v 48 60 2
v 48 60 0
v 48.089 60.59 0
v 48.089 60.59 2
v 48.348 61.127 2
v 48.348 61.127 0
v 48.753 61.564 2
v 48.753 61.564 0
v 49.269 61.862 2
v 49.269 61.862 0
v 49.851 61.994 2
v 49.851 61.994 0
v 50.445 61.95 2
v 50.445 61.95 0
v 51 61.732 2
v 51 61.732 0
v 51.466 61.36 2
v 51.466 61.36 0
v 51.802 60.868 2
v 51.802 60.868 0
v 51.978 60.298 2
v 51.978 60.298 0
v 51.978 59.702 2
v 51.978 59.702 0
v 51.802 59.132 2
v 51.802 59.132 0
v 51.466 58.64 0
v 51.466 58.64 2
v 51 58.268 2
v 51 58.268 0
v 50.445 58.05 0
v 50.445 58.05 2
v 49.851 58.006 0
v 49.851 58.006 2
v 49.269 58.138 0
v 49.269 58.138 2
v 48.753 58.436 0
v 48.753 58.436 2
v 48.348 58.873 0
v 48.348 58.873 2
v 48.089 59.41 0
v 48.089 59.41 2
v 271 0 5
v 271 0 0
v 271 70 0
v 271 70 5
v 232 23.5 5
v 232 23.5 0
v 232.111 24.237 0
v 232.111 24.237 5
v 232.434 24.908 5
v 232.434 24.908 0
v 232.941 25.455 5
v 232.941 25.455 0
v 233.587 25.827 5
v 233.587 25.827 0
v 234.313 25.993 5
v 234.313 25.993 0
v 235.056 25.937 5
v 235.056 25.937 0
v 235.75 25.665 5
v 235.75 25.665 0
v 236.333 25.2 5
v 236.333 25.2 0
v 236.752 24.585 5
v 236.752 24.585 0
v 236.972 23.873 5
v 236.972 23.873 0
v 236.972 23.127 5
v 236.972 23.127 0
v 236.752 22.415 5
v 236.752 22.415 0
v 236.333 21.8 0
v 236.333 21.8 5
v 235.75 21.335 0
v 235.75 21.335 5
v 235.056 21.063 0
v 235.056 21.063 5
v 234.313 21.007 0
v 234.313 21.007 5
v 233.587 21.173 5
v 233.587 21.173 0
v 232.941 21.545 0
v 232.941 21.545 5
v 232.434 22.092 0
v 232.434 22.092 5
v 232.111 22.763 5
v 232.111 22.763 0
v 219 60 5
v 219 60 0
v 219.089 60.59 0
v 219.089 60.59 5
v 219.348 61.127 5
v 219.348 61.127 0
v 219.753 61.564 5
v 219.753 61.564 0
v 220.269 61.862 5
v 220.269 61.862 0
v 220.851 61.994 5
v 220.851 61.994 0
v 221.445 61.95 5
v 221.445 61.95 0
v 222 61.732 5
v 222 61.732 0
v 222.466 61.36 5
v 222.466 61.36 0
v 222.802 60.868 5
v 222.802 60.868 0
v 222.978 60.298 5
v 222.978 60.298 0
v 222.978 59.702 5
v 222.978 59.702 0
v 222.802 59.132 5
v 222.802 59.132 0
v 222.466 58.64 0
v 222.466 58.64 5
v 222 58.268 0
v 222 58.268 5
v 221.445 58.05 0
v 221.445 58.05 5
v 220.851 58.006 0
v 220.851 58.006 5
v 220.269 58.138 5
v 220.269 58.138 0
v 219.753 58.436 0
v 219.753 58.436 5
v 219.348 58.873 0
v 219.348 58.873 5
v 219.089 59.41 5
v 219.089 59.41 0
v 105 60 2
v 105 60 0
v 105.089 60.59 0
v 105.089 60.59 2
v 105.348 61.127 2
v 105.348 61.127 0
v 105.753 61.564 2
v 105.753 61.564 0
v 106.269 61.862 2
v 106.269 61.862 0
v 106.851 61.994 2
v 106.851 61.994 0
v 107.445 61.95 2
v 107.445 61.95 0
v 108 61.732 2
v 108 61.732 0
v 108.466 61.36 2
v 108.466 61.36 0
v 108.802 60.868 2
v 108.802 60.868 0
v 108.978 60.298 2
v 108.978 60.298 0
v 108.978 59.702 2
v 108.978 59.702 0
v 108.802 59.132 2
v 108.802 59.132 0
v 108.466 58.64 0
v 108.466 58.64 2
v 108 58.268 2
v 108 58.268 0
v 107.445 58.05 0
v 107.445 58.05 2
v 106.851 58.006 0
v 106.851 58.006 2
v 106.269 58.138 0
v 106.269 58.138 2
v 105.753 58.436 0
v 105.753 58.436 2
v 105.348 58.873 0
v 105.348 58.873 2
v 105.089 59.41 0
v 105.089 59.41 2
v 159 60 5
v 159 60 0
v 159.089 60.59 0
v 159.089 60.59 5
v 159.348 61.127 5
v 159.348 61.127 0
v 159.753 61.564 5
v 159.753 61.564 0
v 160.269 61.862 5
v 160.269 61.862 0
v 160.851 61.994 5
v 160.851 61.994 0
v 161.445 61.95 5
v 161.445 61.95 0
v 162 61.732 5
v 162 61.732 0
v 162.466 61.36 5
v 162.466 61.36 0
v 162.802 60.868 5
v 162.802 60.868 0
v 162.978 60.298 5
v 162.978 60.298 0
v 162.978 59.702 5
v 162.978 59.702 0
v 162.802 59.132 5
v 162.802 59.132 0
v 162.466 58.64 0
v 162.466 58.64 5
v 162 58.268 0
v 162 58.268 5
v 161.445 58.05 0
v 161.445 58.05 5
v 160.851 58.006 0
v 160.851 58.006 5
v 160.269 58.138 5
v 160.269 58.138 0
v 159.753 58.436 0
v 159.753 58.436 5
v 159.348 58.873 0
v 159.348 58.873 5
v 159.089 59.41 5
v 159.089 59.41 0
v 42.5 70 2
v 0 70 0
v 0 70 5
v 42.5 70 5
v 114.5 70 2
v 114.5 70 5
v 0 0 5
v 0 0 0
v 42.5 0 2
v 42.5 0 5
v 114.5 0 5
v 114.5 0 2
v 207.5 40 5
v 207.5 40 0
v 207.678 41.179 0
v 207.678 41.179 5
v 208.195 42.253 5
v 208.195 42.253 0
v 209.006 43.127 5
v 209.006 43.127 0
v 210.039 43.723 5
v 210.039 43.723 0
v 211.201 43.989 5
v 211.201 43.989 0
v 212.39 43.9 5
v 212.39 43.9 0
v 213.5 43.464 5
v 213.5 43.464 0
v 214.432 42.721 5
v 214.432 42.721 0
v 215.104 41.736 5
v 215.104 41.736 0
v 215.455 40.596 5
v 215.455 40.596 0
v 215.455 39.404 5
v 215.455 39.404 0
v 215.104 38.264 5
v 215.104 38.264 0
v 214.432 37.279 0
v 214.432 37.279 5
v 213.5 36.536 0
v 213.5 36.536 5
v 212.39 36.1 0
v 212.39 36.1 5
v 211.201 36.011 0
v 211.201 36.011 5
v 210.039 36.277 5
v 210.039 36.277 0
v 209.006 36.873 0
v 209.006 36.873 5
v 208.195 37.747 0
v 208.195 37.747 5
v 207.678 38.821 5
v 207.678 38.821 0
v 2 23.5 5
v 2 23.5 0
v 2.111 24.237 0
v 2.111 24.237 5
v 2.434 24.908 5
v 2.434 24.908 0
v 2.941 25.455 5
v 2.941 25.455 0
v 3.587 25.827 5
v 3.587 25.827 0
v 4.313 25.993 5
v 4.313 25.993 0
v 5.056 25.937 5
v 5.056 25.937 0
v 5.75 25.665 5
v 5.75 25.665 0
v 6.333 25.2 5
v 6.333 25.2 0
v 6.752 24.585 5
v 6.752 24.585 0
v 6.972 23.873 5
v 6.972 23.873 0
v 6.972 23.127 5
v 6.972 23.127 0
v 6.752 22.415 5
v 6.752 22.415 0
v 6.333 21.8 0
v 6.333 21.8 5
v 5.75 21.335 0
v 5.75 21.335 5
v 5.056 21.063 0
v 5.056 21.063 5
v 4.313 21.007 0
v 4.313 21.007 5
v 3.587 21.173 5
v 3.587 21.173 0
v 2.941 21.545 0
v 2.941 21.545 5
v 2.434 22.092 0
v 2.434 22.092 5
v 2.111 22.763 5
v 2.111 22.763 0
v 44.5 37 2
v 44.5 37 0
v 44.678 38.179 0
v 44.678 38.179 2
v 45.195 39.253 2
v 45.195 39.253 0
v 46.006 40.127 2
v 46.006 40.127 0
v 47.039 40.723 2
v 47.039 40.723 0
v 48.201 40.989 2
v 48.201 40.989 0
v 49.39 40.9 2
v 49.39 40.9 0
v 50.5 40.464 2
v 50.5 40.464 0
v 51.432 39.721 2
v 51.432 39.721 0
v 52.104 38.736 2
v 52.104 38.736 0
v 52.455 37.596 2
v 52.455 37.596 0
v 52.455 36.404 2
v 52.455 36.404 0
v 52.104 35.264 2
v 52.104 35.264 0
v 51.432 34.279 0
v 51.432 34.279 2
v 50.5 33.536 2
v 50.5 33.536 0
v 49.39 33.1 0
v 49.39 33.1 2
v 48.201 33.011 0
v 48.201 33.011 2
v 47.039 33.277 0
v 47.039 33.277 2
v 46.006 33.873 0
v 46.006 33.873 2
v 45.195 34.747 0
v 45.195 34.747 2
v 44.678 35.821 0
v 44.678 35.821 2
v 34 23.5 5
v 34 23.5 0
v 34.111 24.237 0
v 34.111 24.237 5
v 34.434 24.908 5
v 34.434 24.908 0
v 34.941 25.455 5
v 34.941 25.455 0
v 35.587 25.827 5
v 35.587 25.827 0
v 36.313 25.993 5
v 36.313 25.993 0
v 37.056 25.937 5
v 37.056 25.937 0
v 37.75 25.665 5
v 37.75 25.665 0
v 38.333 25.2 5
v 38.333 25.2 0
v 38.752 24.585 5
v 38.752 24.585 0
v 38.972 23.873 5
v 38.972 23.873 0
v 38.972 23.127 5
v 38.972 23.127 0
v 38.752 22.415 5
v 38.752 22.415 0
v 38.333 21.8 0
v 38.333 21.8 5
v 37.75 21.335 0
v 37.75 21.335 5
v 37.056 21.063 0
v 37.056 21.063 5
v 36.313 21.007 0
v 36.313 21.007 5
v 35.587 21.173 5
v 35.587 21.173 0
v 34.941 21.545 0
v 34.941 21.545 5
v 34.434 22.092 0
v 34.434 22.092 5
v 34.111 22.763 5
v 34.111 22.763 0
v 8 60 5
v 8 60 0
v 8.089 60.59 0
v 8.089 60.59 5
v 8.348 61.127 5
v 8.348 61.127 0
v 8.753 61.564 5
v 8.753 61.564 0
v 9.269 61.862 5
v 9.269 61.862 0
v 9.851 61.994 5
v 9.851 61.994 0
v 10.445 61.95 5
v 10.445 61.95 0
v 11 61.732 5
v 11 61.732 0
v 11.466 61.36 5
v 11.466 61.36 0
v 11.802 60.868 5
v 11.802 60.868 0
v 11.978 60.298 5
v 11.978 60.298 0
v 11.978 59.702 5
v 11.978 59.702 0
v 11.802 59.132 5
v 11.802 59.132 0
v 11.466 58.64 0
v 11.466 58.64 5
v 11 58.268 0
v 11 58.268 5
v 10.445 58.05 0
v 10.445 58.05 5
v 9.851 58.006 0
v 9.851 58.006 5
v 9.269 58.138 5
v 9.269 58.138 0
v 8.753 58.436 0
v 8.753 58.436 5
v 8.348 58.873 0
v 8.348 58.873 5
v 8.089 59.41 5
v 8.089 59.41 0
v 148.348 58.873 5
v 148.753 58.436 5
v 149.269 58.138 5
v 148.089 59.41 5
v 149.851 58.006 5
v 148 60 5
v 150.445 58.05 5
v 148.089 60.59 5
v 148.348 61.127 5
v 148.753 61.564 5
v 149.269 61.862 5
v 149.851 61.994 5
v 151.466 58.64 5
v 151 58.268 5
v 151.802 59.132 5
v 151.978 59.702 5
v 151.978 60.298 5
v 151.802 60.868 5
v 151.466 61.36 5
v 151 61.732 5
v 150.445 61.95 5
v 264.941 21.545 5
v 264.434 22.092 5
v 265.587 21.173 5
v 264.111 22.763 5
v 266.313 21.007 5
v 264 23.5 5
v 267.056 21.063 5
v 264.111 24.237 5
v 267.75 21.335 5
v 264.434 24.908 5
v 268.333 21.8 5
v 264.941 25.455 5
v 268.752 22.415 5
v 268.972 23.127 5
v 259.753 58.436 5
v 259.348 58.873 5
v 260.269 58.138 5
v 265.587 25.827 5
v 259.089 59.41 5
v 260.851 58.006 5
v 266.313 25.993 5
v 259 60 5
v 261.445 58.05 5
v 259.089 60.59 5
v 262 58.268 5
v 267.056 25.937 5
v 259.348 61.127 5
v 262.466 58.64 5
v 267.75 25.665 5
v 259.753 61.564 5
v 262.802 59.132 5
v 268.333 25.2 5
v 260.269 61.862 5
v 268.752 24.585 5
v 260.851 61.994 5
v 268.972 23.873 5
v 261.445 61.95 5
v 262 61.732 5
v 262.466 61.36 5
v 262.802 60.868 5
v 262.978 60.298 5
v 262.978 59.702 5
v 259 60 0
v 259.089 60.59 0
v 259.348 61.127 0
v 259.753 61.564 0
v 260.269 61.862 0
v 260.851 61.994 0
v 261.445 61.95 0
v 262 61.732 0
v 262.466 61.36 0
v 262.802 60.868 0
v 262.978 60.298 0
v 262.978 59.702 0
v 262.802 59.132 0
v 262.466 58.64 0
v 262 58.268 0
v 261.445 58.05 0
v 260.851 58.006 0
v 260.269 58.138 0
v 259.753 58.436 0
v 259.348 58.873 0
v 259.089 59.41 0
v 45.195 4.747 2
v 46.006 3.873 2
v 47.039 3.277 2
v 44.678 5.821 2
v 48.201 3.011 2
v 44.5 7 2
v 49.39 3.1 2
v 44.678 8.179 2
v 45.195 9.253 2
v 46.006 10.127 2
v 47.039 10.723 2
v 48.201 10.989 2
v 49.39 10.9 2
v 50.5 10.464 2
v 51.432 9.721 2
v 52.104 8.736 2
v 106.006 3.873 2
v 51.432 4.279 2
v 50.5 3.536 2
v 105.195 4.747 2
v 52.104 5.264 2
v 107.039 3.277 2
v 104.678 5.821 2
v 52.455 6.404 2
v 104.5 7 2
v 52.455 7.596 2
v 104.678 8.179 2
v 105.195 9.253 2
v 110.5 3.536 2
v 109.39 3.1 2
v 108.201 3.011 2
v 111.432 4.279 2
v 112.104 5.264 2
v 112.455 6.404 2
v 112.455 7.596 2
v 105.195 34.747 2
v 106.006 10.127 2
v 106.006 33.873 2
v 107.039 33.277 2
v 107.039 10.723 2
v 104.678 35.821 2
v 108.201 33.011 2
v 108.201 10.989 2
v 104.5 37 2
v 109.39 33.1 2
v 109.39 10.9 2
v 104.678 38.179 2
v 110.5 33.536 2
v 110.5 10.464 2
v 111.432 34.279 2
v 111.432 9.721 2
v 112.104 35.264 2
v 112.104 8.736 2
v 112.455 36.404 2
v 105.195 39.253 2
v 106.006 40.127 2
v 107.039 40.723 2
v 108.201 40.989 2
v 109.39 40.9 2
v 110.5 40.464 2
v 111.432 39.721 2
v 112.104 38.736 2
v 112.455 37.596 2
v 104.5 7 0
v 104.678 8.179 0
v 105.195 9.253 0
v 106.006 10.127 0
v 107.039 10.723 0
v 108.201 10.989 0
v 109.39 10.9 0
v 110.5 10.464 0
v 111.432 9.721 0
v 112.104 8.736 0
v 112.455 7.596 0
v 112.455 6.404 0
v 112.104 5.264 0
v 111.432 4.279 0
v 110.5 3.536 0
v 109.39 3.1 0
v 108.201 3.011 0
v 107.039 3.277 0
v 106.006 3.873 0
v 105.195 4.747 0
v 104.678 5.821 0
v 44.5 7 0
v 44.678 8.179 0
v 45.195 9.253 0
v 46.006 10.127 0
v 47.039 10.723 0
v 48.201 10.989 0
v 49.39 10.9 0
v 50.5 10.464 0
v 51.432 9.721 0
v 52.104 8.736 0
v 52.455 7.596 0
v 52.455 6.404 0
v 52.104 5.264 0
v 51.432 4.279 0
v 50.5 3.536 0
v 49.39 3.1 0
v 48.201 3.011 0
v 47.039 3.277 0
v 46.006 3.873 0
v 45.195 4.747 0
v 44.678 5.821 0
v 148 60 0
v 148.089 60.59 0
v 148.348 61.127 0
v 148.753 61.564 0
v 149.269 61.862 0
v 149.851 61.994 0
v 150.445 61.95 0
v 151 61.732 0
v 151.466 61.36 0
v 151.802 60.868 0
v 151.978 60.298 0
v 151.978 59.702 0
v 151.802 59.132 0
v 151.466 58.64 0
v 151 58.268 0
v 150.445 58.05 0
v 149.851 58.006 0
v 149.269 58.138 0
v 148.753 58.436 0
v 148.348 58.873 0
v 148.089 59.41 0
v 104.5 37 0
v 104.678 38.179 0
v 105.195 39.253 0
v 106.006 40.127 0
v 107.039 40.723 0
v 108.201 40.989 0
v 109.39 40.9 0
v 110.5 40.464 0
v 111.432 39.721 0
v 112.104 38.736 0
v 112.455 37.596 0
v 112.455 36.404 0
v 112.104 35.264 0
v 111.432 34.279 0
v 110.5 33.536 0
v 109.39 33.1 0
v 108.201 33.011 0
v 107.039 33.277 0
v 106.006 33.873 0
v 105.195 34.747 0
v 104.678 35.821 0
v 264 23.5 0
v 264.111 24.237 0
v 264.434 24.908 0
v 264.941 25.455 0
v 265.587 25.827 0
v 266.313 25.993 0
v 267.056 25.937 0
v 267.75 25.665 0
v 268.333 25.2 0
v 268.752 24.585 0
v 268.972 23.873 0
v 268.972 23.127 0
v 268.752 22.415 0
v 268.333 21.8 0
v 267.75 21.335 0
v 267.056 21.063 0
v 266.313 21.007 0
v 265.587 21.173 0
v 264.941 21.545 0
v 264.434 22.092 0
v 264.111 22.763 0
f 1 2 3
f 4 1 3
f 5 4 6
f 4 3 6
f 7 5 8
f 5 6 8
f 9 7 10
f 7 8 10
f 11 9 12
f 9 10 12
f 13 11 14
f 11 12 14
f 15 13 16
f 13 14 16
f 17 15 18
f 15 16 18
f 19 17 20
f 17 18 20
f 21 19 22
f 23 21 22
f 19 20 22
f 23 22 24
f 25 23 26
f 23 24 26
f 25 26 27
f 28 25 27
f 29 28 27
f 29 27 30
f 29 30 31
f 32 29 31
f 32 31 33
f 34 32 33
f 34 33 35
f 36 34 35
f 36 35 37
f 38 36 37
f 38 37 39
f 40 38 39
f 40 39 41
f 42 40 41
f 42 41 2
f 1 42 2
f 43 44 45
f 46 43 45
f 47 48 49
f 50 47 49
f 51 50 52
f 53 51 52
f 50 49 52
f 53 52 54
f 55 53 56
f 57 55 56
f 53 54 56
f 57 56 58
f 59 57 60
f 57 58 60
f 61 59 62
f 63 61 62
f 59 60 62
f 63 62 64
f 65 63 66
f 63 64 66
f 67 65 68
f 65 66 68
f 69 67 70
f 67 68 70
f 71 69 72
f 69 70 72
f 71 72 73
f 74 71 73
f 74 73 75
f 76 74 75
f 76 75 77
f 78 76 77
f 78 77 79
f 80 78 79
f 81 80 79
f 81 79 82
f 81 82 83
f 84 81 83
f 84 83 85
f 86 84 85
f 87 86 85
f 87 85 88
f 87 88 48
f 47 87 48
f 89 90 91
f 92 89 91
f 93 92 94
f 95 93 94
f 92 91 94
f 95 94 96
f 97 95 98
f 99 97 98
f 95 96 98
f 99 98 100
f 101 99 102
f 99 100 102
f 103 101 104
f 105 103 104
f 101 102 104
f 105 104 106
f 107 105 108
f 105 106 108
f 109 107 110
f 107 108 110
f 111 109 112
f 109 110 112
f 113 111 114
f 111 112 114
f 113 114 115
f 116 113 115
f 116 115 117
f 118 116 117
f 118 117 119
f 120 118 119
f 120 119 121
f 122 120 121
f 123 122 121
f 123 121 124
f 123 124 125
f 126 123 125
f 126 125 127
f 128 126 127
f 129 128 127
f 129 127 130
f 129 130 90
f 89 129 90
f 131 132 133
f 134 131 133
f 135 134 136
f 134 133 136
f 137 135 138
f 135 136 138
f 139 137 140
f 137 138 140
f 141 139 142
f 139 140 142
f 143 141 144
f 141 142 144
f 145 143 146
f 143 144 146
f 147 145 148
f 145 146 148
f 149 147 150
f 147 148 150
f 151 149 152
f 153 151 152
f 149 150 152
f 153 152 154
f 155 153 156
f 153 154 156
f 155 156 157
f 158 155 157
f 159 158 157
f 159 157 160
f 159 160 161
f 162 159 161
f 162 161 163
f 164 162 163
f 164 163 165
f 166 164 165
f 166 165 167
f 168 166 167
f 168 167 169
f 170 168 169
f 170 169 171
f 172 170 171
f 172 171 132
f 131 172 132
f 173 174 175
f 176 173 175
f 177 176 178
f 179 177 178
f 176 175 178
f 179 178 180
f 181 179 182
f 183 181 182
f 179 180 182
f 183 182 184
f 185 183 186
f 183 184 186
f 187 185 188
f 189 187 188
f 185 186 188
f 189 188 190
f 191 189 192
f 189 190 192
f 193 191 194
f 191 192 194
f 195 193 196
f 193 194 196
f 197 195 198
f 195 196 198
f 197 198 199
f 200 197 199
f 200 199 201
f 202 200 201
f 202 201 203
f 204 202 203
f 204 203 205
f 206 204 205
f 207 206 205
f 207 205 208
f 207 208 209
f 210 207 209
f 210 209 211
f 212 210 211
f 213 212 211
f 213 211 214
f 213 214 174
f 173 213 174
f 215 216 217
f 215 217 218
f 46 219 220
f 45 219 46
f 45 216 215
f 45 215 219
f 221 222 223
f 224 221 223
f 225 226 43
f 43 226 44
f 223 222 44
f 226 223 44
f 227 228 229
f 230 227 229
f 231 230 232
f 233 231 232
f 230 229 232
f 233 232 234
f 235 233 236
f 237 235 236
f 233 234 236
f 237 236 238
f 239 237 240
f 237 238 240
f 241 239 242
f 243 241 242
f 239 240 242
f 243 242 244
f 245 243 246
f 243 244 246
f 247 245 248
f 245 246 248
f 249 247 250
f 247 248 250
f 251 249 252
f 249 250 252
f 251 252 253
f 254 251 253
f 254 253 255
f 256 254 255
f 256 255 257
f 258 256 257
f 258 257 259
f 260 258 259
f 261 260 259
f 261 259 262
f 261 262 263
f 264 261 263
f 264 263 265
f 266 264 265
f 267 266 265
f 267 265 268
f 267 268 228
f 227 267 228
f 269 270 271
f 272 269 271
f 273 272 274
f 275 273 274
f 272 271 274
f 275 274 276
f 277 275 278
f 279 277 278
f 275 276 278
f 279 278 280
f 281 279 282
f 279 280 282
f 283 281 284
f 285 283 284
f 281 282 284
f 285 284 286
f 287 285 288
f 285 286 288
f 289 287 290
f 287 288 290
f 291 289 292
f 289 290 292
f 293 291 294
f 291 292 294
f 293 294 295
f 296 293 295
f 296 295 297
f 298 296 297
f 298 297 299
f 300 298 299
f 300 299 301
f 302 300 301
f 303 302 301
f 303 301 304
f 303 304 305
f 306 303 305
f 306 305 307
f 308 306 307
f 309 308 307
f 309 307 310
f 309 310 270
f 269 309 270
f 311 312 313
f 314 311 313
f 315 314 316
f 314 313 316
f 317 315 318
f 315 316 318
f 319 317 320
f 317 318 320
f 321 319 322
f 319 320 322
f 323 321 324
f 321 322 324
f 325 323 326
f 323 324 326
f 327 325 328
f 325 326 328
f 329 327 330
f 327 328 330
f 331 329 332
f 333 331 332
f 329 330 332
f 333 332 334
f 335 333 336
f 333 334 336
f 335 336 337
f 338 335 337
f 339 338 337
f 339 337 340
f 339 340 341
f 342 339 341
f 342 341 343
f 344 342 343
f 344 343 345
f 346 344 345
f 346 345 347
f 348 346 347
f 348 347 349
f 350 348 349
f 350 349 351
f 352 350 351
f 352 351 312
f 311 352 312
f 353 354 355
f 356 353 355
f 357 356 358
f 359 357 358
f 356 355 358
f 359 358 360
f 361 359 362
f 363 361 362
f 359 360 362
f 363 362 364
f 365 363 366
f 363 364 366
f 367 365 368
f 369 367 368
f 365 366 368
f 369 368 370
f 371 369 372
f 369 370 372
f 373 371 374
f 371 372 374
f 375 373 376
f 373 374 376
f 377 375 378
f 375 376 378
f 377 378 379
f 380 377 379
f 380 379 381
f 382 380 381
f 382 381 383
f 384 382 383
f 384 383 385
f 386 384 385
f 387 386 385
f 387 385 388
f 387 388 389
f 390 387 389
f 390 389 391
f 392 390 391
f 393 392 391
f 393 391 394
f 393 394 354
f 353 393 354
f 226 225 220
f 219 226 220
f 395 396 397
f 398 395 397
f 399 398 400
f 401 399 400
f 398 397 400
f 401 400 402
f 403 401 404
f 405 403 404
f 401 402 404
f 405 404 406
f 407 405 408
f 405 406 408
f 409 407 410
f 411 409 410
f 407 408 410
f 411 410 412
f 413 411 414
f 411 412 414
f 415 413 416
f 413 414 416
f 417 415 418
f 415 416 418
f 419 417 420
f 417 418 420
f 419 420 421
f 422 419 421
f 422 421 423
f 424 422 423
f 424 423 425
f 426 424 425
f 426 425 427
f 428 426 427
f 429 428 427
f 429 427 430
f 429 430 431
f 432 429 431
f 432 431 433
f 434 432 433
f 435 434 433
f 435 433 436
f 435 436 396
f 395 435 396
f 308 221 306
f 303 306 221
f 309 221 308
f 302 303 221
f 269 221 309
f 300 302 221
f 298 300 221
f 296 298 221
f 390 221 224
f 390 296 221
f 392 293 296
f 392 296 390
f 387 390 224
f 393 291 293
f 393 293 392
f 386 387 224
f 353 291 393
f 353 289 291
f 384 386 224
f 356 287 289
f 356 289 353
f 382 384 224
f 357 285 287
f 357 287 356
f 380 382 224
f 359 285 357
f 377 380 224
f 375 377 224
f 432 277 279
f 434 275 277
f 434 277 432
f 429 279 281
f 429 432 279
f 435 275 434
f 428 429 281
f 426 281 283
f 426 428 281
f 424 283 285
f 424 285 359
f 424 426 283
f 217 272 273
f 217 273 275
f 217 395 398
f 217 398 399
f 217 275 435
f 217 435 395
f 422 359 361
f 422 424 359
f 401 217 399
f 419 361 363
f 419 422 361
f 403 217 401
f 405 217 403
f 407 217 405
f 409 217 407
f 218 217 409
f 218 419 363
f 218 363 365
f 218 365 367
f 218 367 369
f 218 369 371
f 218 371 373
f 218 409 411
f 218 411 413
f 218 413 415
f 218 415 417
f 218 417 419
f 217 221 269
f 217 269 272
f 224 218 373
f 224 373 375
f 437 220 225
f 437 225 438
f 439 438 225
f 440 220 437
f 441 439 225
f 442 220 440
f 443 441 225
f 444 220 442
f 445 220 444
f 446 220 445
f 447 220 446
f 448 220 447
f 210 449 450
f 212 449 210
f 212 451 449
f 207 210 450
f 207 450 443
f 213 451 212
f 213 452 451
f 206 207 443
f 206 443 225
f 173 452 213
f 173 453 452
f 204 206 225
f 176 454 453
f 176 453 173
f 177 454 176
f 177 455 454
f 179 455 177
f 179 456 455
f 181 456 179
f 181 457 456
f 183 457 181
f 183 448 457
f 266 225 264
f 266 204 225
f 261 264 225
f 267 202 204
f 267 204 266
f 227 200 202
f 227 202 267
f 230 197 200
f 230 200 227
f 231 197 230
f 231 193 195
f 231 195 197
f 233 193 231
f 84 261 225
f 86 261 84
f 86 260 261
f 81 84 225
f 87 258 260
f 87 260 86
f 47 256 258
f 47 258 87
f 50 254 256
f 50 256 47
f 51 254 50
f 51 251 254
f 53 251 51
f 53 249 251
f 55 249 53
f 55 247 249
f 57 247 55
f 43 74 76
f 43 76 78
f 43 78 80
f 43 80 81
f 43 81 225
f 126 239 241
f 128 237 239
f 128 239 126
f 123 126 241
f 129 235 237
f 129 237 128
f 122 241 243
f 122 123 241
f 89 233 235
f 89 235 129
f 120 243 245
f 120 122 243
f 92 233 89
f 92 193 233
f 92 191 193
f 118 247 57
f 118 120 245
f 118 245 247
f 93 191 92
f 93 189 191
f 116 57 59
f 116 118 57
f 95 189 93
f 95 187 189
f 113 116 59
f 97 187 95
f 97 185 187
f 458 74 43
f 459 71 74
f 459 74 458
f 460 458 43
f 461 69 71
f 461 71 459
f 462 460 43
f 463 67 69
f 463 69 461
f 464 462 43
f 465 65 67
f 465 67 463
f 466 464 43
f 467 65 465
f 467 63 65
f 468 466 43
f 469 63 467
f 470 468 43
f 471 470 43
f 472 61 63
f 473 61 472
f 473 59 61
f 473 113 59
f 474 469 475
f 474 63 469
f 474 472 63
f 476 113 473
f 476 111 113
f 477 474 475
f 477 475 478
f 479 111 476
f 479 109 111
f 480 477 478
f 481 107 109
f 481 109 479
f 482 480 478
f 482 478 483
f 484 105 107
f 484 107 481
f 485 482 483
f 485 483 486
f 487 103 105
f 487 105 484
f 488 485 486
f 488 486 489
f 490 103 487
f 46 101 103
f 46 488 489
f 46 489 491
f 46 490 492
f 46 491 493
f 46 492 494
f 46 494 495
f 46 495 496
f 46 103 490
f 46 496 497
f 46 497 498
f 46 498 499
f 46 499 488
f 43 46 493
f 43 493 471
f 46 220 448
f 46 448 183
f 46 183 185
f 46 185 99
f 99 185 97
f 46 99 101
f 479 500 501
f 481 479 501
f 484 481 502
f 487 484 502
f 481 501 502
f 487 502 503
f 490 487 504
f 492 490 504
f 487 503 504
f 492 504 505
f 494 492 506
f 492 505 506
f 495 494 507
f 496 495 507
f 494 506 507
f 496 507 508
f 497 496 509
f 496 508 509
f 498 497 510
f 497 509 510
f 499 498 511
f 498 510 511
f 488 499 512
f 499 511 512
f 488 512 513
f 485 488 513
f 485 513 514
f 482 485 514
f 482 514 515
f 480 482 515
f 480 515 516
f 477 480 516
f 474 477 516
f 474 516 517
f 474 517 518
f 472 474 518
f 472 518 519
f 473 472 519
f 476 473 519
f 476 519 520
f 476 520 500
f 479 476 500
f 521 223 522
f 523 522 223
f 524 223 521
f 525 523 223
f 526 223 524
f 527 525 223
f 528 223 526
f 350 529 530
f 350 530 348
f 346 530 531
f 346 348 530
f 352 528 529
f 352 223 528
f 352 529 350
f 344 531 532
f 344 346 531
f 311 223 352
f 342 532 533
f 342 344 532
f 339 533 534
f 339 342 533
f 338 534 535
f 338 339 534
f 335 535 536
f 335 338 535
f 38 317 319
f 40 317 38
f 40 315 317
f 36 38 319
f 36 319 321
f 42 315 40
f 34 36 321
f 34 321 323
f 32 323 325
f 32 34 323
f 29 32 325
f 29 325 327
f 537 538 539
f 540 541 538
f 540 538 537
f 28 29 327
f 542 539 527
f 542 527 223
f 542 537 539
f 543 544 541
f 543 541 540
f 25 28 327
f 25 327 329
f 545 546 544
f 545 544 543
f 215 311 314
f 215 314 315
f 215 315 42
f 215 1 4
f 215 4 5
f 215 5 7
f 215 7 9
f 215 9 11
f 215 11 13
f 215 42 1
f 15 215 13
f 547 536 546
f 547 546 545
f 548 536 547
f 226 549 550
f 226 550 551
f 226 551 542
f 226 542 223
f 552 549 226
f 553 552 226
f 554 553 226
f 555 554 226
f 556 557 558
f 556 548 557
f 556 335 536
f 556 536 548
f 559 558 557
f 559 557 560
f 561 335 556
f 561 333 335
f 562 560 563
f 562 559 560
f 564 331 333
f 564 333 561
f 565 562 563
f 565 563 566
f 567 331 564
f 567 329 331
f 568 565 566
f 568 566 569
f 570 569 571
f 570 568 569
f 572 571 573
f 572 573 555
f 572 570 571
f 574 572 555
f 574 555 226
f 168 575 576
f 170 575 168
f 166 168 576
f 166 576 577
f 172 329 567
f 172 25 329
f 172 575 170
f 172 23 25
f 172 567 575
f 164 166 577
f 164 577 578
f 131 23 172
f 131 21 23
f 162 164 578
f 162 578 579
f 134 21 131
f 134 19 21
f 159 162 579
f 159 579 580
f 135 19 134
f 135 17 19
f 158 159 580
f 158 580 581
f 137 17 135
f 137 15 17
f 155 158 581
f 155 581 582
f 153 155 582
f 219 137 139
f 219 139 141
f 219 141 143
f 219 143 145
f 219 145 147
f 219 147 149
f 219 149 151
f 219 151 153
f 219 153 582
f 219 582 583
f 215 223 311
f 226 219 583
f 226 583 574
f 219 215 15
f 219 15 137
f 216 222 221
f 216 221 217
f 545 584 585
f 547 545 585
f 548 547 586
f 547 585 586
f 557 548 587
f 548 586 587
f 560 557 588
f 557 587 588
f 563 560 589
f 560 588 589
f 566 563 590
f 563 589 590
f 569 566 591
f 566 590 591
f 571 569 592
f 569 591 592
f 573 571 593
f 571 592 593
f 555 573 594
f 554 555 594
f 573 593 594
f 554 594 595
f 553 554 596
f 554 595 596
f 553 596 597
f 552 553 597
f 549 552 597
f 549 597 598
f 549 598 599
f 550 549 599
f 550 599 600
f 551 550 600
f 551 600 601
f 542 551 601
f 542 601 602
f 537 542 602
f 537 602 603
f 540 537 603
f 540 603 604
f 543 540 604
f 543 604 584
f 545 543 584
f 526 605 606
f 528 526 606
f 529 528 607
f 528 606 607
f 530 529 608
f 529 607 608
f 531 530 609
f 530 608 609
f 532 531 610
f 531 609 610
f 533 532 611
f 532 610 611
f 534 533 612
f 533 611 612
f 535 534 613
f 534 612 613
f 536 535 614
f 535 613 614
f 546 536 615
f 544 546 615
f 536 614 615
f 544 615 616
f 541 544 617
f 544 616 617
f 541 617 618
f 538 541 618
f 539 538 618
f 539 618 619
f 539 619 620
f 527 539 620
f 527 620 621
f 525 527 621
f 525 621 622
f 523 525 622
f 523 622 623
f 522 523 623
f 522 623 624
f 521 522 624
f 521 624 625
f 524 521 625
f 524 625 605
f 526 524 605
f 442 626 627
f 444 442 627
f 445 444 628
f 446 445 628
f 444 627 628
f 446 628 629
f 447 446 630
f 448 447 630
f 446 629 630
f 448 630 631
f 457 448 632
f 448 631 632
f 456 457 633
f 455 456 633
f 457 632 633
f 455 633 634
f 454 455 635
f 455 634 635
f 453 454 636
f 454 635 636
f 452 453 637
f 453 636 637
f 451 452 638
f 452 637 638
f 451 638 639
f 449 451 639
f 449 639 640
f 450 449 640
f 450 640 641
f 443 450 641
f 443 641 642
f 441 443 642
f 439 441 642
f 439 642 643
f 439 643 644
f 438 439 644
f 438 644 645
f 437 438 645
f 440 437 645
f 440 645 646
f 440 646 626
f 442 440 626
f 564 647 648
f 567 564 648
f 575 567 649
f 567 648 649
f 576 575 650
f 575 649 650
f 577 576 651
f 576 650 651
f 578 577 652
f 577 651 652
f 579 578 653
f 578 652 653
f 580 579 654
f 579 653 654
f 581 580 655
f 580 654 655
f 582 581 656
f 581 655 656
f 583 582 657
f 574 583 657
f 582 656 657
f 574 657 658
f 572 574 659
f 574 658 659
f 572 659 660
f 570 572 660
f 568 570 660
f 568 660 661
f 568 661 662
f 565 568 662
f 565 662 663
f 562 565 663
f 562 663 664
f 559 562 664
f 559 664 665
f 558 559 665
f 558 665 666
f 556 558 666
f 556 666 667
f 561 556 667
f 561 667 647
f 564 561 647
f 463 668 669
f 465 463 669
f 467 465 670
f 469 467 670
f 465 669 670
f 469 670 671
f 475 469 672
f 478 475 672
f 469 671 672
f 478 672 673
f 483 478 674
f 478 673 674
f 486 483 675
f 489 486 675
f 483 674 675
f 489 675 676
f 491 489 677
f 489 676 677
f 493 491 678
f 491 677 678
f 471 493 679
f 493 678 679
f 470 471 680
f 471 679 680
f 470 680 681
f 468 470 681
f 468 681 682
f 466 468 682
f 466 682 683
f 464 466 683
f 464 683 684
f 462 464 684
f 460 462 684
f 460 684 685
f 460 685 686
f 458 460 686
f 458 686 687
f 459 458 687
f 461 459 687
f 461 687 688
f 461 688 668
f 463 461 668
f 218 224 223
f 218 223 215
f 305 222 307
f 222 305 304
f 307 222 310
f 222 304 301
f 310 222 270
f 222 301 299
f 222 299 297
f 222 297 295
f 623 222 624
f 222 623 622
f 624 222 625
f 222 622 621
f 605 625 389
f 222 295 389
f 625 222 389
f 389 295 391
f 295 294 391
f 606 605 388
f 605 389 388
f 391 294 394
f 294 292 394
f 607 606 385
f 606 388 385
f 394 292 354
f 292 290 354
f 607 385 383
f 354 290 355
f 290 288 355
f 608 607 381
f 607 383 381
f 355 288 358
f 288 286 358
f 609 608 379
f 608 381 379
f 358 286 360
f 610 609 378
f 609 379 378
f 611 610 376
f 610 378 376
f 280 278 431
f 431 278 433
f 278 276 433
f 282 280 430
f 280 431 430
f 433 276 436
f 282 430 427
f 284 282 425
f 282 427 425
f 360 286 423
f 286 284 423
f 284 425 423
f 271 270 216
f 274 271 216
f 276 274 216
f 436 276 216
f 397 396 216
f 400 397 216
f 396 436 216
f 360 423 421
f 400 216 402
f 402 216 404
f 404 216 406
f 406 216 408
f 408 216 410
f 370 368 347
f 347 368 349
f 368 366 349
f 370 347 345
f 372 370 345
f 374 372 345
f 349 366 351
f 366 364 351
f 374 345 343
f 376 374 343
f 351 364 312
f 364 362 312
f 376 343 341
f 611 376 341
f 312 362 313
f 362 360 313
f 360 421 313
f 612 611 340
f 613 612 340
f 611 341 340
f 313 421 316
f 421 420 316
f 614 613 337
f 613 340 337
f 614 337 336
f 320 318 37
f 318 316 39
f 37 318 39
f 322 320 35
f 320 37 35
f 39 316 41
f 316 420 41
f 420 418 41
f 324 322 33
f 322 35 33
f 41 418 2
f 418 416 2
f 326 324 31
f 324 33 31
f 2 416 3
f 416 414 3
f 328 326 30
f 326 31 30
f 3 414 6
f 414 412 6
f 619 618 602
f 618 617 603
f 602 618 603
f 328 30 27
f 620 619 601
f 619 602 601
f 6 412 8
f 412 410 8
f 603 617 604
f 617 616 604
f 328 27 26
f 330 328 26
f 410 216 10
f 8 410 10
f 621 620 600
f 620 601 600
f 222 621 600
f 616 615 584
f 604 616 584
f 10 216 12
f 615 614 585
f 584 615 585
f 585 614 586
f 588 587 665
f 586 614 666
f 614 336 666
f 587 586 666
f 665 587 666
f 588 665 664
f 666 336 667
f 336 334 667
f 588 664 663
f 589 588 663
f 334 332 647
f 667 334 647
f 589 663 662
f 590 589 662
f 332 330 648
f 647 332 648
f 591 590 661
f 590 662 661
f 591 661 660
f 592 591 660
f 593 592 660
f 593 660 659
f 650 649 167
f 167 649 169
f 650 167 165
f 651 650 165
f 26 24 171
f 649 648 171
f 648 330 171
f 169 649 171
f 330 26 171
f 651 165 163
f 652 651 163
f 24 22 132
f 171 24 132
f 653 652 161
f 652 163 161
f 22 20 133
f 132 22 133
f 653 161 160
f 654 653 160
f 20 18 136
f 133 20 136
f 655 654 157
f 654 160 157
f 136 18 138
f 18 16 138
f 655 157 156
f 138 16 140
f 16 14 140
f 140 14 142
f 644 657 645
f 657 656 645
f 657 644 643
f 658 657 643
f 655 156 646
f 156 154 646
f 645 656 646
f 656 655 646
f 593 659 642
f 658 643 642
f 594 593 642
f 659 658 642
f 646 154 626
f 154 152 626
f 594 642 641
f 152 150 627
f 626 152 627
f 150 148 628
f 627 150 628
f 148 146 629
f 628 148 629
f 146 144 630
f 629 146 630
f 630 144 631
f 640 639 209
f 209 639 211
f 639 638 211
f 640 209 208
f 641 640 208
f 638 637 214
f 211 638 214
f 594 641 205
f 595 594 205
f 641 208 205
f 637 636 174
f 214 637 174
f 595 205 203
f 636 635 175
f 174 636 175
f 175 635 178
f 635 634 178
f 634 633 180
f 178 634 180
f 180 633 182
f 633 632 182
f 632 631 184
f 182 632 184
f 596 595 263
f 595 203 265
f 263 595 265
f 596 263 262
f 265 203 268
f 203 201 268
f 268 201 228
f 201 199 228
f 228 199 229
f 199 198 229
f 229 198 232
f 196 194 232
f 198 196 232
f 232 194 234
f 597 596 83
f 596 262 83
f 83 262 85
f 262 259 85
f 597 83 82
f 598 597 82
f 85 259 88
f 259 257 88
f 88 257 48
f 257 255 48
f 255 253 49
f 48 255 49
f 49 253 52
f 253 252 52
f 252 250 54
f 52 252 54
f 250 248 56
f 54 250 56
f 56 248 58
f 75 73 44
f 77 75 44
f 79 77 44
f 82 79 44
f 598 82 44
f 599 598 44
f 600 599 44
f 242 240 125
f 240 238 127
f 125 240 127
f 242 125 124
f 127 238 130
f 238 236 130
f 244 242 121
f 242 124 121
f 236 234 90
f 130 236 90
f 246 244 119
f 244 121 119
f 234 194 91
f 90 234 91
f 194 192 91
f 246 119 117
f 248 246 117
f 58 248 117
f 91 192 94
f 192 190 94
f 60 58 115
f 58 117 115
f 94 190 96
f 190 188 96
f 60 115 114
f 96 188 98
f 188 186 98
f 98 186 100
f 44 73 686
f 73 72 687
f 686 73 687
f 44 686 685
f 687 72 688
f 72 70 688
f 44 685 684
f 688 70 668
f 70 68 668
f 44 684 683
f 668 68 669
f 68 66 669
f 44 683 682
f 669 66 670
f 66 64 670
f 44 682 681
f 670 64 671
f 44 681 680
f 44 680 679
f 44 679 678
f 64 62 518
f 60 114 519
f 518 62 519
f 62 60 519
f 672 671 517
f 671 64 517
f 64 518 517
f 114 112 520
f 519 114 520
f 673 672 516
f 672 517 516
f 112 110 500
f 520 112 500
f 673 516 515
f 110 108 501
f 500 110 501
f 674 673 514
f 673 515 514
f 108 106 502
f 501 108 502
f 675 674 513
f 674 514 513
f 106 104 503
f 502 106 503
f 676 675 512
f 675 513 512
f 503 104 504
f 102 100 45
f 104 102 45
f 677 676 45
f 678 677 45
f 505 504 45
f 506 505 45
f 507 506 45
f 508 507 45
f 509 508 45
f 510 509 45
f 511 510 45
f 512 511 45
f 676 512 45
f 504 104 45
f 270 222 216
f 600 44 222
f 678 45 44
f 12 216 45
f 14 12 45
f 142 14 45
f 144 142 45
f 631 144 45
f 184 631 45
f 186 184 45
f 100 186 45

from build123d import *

# Parameters (mm, degrees)
SKIZZE1_W                       = 271
SKIZZE1_H                       = 70
AUFSATZ_LINEAR_AUSTRAGEN1_DEPTH = 5
SKIZZE2_W                       = 72
SKIZZE2_H                       = 70
SCHNITT_LINEAR_AUSTRAGEN1_DEPTH = 3
SKIZZE3_R                       = 4
SCHNITT_LINEAR_AUSTRAGEN2_DEPTH = 10
SKIZZE4_R                       = 2.5
SCHNITT_LINEAR_AUSTRAGEN3_DEPTH = 10
SKIZZE5_R                       = 2.5
SCHNITT_LINEAR_AUSTRAGEN4_DEPTH = 10
SKIZZE6_R                       = 2
SCHNITT_LINEAR_AUSTRAGEN5_DEPTH = 10
SKIZZE7_R                       = 4
SCHNITT_LINEAR_AUSTRAGEN6_DEPTH = 10
SKIZZE8_R                       = 2
SCHNITT_LINEAR_AUSTRAGEN7_DEPTH = 10


with BuildPart() as part:
    # Skizze1 → Aufsatz-Linear austragen1 (new body)
    with BuildSketch(Plane.XY):
        with Locations((135.5, 35)):
            Rectangle(SKIZZE1_W, SKIZZE1_H)
    extrude(amount=AUFSATZ_LINEAR_AUSTRAGEN1_DEPTH)

    # Skizze2 → Schnitt-Linear austragen1 (cut)
    with BuildSketch(Plane.XY.offset(5)):
        with Locations((78.5, 35)):
            Rectangle(SKIZZE2_W, SKIZZE2_H)
    extrude(amount=-SCHNITT_LINEAR_AUSTRAGEN1_DEPTH, mode=Mode.SUBTRACT)

    # Skizze3 → Schnitt-Linear austragen2 (cut)
    with BuildSketch(Plane(origin=(0, 0, 0), x_dir=(-1, 0, 0), z_dir=(0, 0, -1))):
        with Locations((-48.5, 37)):
            Circle(SKIZZE3_R)
        with Locations((-108.5, 37)):
            Circle(SKIZZE3_R)
        with Locations((-108.5, 7)):
            Circle(SKIZZE3_R)
        with Locations((-48.5, 7)):
            Circle(SKIZZE3_R)
    extrude(amount=-SCHNITT_LINEAR_AUSTRAGEN2_DEPTH, mode=Mode.SUBTRACT)

    # Skizze4 → Schnitt-Linear austragen3 (cut)
    with BuildSketch(Plane(origin=(0, 0, 0), x_dir=(-1, 0, 0), z_dir=(0, 0, -1))):
        with Locations((-234.5, 23.5)):
            Circle(SKIZZE4_R)
        with Locations((-266.5, 23.5)):
            Circle(SKIZZE4_R)
    extrude(amount=-SCHNITT_LINEAR_AUSTRAGEN3_DEPTH, mode=Mode.SUBTRACT)

    # Skizze5 → Schnitt-Linear austragen4 (cut)
    with BuildSketch(Plane(origin=(0, 0, 0), x_dir=(-1, 0, 0), z_dir=(0, 0, -1))):
        with Locations((-36.5, 23.5)):
            Circle(SKIZZE5_R)
        with Locations((-4.5, 23.5)):
            Circle(SKIZZE5_R)
    extrude(amount=-SCHNITT_LINEAR_AUSTRAGEN4_DEPTH, mode=Mode.SUBTRACT)

    # Skizze6 → Schnitt-Linear austragen5 (cut)
    with BuildSketch(Plane(origin=(0, 0, 0), x_dir=(-1, 0, 0), z_dir=(0, 0, -1))):
        with Locations((-10, 60)):
            Circle(SKIZZE6_R)
        with Locations((-50, 60)):
            Circle(SKIZZE6_R)
        with Locations((-161, 60)):
            Circle(SKIZZE6_R)
        with Locations((-221, 60)):
            Circle(SKIZZE6_R)
        with Locations((-261, 60)):
            Circle(SKIZZE6_R)
        with Locations((-107, 60)):
            Circle(SKIZZE6_R)
    extrude(amount=-SCHNITT_LINEAR_AUSTRAGEN5_DEPTH, mode=Mode.SUBTRACT)

    # Skizze7 → Schnitt-Linear austragen6 (cut)
    with BuildSketch(Plane(origin=(0, 0, 0), x_dir=(-1, 0, 0), z_dir=(0, 0, -1))):
        with Locations((-211.5, 40)):
            Circle(SKIZZE7_R)
    extrude(amount=-SCHNITT_LINEAR_AUSTRAGEN6_DEPTH, mode=Mode.SUBTRACT)

    # Skizze8 → Schnitt-Linear austragen7 (cut)
    with BuildSketch(Plane(origin=(0, 0, 0), x_dir=(-1, 0, 0), z_dir=(0, 0, -1))):
        with Locations((-150, 60)):
            Circle(SKIZZE8_R)
    extrude(amount=-SCHNITT_LINEAR_AUSTRAGEN7_DEPTH, mode=Mode.SUBTRACT)


solid = part.part
